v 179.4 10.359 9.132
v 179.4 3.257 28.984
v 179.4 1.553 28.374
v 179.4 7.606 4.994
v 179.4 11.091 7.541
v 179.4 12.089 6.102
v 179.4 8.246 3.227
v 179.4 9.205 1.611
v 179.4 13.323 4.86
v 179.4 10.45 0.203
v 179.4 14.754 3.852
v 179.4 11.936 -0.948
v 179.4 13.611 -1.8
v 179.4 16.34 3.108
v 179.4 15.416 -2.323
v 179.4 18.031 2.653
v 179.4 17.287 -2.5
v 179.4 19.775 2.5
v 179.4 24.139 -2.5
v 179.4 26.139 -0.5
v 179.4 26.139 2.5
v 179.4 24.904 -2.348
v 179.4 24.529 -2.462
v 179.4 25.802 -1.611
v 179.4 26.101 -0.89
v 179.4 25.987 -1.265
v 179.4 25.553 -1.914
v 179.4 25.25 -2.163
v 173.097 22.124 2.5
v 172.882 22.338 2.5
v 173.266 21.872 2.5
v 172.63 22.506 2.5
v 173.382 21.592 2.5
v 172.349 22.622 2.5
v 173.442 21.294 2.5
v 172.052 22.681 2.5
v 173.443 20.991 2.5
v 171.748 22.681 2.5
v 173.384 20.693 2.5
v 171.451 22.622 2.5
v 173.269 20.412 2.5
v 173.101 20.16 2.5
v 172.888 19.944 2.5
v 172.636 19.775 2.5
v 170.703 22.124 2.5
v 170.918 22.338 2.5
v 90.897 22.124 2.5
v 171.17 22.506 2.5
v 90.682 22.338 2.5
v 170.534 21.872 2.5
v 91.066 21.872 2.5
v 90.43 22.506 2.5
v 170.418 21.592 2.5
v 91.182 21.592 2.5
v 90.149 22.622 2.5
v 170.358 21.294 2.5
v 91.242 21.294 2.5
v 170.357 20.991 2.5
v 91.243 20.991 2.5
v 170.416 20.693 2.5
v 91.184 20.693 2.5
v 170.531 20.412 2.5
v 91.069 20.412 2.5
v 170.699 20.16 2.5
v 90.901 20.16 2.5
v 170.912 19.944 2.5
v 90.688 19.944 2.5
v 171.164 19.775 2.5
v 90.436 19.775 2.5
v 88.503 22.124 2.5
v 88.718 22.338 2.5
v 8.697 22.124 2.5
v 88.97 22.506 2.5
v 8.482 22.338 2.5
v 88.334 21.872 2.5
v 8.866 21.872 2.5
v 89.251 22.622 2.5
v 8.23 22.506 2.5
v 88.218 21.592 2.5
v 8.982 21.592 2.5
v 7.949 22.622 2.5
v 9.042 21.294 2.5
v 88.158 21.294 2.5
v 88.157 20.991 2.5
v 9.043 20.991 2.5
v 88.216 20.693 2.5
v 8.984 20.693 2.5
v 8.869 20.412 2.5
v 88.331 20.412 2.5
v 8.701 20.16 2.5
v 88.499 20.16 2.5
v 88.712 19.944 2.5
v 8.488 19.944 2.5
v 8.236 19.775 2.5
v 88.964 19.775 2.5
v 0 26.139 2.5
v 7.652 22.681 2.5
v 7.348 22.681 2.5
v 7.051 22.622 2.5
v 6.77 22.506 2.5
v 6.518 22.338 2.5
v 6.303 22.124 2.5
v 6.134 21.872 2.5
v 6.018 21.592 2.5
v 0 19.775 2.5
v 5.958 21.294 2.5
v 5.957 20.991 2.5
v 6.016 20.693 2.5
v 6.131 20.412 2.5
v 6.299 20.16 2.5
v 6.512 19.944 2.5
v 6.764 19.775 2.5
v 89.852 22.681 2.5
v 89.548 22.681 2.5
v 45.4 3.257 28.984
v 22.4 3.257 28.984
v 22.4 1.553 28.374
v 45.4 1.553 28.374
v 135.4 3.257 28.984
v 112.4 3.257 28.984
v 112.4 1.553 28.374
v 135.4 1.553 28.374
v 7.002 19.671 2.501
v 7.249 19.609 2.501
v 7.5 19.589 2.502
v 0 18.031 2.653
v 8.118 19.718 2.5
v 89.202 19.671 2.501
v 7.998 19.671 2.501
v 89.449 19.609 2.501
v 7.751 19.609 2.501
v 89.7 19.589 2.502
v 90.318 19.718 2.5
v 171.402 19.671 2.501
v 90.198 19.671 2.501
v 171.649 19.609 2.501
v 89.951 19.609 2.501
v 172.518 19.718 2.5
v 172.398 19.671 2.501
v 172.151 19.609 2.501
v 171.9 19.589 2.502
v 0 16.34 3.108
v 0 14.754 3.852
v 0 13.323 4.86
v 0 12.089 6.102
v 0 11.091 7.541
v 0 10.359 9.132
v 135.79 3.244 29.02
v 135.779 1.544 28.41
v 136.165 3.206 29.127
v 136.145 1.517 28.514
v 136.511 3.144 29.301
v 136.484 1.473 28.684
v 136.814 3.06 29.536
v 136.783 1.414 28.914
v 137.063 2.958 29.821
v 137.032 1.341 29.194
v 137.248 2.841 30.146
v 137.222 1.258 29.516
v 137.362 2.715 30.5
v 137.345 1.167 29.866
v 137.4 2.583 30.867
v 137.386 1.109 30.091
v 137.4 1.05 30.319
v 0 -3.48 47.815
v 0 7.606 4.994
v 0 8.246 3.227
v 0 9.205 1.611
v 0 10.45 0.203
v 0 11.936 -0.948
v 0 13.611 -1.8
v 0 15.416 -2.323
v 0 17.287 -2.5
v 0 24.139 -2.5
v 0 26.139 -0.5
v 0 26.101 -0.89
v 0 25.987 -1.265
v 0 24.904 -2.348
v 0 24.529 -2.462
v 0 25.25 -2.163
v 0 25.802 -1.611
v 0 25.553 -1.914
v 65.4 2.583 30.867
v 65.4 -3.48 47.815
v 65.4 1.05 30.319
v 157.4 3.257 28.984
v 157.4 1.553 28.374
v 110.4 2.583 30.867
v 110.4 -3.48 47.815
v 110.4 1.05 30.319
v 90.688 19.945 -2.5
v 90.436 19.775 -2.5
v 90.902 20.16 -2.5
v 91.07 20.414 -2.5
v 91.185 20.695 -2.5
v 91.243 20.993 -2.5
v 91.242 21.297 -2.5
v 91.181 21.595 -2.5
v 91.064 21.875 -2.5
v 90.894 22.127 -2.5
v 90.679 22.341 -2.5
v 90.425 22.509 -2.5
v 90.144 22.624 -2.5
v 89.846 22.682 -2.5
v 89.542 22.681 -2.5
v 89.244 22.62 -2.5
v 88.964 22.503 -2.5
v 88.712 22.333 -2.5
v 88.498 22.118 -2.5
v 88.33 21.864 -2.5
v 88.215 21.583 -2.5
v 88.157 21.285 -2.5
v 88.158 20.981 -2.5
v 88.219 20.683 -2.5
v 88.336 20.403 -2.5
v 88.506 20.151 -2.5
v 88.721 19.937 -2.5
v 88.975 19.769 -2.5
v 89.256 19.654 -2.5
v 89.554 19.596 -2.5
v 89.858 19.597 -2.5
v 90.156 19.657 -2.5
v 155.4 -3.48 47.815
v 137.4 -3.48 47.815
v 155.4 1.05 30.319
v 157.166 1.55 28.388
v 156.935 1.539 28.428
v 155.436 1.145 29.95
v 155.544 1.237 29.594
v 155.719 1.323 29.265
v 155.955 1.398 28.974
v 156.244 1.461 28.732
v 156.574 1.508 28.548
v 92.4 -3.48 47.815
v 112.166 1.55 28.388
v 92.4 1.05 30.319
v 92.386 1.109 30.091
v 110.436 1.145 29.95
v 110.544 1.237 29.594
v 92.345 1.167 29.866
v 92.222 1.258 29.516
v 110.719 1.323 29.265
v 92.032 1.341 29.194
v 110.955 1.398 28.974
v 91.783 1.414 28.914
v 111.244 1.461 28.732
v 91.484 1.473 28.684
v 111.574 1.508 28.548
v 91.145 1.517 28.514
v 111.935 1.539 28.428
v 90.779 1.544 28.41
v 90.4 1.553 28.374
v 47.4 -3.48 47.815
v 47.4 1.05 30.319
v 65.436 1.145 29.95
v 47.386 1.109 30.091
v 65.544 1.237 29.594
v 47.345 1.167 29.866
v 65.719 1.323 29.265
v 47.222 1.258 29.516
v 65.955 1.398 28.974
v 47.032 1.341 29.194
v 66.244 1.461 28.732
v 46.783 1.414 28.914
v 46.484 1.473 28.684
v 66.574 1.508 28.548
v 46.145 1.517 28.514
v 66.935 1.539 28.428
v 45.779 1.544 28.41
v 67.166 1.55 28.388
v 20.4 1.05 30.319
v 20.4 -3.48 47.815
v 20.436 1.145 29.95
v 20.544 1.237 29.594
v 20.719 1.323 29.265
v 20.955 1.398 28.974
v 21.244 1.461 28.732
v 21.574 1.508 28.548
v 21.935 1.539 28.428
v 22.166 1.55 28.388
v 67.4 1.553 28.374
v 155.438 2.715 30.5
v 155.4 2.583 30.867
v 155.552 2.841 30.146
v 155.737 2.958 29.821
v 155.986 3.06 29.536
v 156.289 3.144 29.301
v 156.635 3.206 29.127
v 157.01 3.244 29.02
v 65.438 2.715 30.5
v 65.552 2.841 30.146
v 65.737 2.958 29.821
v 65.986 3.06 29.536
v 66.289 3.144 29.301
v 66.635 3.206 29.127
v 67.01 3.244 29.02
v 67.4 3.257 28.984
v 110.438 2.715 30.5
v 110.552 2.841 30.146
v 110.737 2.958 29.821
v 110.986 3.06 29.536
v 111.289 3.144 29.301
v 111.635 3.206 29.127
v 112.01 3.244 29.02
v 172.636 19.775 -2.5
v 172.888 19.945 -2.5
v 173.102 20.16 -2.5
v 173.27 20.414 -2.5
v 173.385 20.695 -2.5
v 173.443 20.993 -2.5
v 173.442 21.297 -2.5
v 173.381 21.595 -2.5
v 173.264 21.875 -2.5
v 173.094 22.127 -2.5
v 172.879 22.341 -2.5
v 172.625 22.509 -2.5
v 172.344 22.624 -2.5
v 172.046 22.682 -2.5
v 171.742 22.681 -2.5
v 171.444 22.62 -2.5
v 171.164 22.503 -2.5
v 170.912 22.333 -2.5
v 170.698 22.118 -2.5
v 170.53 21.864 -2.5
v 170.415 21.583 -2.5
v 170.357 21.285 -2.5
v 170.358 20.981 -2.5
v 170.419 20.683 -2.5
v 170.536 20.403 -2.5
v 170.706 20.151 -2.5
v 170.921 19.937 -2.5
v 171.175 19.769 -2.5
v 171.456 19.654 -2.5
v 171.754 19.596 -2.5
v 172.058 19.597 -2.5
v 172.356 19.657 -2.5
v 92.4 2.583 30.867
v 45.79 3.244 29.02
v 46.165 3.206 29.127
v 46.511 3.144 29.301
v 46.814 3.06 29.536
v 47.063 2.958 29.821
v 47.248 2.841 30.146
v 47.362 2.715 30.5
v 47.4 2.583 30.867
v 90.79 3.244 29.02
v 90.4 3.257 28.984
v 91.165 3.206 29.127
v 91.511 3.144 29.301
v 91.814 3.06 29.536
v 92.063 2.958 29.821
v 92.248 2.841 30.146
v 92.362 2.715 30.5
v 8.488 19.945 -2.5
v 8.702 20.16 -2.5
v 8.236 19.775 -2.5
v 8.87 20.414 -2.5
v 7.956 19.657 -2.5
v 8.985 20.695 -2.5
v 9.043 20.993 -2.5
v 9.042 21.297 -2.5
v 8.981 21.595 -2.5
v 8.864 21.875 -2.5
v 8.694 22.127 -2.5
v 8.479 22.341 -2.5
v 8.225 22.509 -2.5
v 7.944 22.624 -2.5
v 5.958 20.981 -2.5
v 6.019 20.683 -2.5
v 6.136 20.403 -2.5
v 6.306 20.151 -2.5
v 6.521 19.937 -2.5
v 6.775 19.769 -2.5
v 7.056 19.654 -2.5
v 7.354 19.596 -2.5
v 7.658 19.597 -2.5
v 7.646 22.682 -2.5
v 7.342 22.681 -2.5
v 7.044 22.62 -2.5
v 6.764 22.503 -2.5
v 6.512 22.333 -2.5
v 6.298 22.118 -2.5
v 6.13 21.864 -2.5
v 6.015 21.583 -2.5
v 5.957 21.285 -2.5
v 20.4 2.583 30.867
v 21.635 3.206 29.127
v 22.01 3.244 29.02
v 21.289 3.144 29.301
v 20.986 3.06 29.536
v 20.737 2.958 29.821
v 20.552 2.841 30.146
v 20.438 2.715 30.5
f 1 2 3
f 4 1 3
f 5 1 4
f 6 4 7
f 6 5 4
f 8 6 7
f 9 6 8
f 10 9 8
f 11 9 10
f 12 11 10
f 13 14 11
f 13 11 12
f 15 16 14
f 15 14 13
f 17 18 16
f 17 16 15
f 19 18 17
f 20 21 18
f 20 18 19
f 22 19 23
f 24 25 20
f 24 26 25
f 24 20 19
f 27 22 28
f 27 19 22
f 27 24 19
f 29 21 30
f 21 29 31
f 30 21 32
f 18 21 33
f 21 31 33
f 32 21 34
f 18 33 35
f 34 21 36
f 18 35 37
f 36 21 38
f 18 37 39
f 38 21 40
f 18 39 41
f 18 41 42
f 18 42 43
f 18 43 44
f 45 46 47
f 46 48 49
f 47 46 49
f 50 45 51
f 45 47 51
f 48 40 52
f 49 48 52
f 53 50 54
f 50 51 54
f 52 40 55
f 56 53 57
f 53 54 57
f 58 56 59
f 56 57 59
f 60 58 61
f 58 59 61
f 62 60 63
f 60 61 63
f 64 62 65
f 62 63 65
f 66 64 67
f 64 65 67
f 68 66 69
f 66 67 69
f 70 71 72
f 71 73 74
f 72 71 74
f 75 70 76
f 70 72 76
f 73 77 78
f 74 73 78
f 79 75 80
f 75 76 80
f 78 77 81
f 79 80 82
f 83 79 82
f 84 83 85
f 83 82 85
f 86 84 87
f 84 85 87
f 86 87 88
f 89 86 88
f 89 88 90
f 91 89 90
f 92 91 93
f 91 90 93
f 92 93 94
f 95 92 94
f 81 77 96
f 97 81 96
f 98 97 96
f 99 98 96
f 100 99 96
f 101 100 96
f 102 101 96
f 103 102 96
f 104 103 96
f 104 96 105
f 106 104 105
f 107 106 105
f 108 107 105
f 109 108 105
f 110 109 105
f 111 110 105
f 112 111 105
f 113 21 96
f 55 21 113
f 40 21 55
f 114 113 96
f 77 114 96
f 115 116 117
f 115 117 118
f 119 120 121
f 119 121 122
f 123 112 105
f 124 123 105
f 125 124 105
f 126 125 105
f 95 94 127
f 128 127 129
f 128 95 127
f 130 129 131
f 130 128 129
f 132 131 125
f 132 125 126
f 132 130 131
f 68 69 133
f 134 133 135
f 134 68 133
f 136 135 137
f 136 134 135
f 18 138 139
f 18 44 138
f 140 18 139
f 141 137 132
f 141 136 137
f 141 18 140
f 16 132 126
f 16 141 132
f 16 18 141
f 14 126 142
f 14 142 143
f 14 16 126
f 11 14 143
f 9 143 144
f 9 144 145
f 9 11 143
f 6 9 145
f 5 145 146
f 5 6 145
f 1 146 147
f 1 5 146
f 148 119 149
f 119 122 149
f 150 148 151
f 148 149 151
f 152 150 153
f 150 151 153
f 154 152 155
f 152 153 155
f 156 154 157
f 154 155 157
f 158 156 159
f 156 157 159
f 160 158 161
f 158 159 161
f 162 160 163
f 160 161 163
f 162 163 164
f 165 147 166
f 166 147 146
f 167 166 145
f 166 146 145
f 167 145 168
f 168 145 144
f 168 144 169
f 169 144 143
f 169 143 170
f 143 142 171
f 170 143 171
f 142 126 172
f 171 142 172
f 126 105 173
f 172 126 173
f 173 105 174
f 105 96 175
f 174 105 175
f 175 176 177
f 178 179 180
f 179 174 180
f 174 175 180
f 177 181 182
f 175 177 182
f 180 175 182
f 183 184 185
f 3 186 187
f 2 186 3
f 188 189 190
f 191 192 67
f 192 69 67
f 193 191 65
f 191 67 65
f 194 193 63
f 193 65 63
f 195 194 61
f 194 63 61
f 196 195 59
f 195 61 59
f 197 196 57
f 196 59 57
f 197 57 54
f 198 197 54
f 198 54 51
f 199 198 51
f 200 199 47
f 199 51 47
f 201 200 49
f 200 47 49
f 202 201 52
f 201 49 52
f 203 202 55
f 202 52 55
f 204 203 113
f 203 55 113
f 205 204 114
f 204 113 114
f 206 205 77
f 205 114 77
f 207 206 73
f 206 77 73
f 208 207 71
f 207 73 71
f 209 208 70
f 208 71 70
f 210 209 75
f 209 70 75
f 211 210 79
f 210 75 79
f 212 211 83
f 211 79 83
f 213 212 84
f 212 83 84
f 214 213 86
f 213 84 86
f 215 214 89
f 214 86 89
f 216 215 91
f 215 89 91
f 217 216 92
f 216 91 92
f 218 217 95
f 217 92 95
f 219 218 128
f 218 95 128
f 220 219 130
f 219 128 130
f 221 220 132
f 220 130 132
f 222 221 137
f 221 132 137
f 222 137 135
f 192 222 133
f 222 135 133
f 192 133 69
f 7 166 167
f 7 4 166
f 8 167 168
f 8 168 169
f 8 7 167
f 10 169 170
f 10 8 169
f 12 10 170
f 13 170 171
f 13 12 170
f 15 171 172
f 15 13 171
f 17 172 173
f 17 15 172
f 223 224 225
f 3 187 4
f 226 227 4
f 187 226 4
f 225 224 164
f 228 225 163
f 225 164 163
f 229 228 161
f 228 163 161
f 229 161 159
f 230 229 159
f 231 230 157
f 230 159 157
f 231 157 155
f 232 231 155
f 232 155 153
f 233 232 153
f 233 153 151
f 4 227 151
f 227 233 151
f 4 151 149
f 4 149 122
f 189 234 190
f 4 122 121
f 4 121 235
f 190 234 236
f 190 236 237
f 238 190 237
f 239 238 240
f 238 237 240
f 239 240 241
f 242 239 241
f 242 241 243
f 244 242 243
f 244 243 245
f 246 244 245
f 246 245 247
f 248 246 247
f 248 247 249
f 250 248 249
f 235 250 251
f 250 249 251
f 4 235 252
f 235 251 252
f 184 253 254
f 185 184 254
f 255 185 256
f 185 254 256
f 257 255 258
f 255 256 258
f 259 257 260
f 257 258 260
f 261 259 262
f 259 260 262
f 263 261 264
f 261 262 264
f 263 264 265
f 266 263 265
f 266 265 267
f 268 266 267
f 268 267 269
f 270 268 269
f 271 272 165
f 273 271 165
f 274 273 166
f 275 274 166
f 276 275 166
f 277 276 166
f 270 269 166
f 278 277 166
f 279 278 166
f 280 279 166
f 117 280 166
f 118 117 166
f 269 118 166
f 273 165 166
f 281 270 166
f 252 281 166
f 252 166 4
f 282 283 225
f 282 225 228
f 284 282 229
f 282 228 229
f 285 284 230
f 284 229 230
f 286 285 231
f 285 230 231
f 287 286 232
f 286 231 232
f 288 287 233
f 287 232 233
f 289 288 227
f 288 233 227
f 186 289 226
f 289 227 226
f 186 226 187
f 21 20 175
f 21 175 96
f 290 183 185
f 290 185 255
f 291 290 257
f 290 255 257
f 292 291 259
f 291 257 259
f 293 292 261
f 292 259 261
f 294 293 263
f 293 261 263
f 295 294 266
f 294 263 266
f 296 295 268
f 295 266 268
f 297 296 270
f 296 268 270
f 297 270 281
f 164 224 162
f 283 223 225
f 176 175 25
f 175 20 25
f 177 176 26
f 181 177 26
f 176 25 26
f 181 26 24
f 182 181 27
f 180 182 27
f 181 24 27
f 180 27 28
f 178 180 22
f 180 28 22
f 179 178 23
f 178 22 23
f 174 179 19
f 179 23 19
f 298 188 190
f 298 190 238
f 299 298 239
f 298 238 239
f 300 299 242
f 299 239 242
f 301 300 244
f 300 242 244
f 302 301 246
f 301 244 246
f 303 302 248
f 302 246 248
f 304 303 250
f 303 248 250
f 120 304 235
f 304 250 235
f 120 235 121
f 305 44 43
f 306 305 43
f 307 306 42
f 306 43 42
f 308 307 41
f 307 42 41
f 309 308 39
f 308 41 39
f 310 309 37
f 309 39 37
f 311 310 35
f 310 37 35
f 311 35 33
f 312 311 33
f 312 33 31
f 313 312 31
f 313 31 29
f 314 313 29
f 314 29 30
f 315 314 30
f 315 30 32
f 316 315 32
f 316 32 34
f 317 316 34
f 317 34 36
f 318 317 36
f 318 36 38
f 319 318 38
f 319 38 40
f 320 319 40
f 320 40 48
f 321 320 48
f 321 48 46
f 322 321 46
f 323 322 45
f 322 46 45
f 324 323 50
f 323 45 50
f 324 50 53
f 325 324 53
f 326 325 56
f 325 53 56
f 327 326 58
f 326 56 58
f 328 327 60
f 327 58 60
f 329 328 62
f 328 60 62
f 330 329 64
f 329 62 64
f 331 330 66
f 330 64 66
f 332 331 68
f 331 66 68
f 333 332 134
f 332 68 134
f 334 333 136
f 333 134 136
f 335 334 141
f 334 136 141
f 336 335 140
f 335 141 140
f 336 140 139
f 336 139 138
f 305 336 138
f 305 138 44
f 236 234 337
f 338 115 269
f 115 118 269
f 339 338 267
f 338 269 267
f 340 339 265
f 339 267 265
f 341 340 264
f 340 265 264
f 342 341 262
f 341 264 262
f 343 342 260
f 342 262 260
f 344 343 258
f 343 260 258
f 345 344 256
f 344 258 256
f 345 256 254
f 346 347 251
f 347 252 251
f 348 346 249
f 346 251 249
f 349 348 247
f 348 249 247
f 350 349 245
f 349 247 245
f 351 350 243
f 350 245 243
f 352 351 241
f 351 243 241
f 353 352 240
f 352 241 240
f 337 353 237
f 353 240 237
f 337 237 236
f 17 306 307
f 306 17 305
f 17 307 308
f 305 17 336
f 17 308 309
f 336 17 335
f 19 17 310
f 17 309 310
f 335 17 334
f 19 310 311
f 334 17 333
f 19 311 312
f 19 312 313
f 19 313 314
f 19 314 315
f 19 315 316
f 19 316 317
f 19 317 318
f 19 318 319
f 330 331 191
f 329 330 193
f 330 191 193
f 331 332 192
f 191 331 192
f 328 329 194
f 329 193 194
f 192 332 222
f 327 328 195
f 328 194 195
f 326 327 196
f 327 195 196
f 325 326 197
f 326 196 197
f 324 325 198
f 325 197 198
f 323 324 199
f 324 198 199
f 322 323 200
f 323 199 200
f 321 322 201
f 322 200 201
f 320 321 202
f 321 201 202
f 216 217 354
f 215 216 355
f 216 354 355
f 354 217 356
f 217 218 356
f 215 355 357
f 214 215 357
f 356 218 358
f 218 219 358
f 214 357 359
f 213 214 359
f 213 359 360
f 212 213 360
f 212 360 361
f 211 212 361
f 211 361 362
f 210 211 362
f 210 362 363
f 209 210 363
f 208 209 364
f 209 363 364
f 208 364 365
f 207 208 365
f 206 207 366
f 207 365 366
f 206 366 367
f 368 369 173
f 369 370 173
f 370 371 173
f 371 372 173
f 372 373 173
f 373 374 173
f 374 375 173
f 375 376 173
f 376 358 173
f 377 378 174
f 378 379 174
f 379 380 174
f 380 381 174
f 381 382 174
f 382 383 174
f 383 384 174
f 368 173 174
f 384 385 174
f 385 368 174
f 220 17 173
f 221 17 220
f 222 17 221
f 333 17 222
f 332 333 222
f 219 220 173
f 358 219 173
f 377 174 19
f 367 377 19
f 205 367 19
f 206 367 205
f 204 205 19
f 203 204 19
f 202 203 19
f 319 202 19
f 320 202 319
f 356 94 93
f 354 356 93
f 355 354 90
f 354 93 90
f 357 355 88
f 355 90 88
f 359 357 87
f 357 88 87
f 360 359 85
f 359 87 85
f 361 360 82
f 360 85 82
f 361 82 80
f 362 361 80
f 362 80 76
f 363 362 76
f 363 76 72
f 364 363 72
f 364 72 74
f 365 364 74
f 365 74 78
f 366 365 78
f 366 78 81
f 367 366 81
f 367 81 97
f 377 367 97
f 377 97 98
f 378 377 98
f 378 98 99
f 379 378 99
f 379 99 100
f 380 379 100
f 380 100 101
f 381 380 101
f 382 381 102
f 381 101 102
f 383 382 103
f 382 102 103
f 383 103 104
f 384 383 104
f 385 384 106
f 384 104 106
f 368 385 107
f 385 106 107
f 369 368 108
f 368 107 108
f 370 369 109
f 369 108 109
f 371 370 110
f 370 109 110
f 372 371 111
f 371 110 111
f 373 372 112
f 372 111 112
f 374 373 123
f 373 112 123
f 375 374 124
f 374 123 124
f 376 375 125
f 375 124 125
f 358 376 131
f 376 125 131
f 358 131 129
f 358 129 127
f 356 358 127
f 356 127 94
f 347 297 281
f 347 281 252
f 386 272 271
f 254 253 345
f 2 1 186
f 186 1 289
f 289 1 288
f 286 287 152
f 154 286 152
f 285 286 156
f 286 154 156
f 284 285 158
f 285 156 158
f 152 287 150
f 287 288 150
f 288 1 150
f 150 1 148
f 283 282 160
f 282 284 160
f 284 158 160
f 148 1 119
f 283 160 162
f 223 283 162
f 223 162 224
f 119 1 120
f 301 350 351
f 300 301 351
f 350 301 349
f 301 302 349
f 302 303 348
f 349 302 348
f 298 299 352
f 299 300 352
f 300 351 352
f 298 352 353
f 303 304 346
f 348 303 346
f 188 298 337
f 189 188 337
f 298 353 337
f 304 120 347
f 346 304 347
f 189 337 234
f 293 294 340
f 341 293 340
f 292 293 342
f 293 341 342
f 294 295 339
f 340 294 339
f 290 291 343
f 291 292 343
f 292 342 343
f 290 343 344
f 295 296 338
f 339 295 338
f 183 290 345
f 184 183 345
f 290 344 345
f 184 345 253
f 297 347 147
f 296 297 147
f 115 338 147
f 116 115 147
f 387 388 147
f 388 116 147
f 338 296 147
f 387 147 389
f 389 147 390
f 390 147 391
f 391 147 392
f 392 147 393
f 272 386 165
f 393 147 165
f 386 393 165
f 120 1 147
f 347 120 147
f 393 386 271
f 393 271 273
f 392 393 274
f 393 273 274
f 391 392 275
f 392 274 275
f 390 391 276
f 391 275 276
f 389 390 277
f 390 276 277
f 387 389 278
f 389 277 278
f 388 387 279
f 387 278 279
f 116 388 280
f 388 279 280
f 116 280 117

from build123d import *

# Parameters (mm, degrees)
BOSS_EXTRUDE1_DEPTH = 179.4
FILLET1_R           = 10
FILLET3_R           = 2
SKETCH3_R           = 1.55
CUT_EXTRUDE2_DEPTH  = 10
CUT_EXTRUDE4_REACH  = 187.252
SKETCH6_W           = 27
SKETCH6_H           = 20
FILLET4_R           = 2


with BuildPart() as part:
    # Sketch1 → Boss-Extrude1 (new body)
    with BuildSketch(Plane(origin=(0, 0, 0), x_dir=(0, 0, -1), z_dir=(1, 0, 0))):
        Polygon((-2.5, 26.138937515), (-2.5, 12.731613167), (-47.815237798, -3.479647722), (2.5, 9.546261863), (2.5, 26.138937515), align=None)
    extrude(amount=BOSS_EXTRUDE1_DEPTH)

    # Fillet1
    fillet1_edges = [part.edges().sort_by_distance(p)[0] for p in [
        (89.7, 12.731613167, 2.5),
        (89.7, 9.546261863, -2.5),
    ]]
    fillet(fillet1_edges, radius=FILLET1_R)

    # Fillet3
    fillet3_edges = [part.edges().sort_by_distance(p)[0] for p in [
        (89.7, 26.138937515, -2.5),
    ]]
    fillet(fillet3_edges, radius=FILLET3_R)

    # Sketch3 → Cut-Extrude2 (cut, symmetric)
    with BuildSketch(Plane.XY.offset(2.5)):
        with Locations(Location((7.5, 21.138937515, 0), (0, 0, 298.348188053))):
            Circle(SKETCH3_R)
        with Locations(Location((171.9, 21.138937515, 0), (0, 0, 298.348188053))):
            Circle(SKETCH3_R)
        with Locations(Location((89.7, 21.138937515, 0), (0, 0, 298.348188053))):
            Circle(SKETCH3_R)
    extrude(amount=CUT_EXTRUDE2_DEPTH, both=True, mode=Mode.SUBTRACT)

    # Sketch6 → Cut-Extrude4 (cut, up to next)
    with BuildSketch(Plane(origin=(0, 12.079968612, 4.321538013), x_dir=(1, 0, 0), z_dir=(0, 0.9415624549372754, 0.33683845304907145)), mode=Mode.PRIVATE) as cut_extrude4_sk1:
        with Locations((168.9, -36.19311184)):
            Rectangle(SKETCH6_W, SKETCH6_H)
    cut_extrude4_tool1 = extrude(cut_extrude4_sk1.sketch, amount=-CUT_EXTRUDE4_REACH, mode=Mode.PRIVATE) & part.part
    # Sketch6 → Cut-Extrude4 (cut, up to next)
    with BuildSketch(Plane(origin=(0, 12.079968612, 4.321538013), x_dir=(1, 0, 0), z_dir=(0, 0.9415624549372754, 0.33683845304907145)), mode=Mode.PRIVATE) as cut_extrude4_sk2:
        with Locations((123.9, -36.19311184)):
            Rectangle(SKETCH6_W, SKETCH6_H)
    cut_extrude4_tool2 = extrude(cut_extrude4_sk2.sketch, amount=-CUT_EXTRUDE4_REACH, mode=Mode.PRIVATE) & part.part
    # Sketch6 → Cut-Extrude4 (cut, up to next)
    with BuildSketch(Plane(origin=(0, 12.079968612, 4.321538013), x_dir=(1, 0, 0), z_dir=(0, 0.9415624549372754, 0.33683845304907145)), mode=Mode.PRIVATE) as cut_extrude4_sk3:
        with Locations((78.9, -36.19311184)):
            Rectangle(SKETCH6_W, SKETCH6_H)
    cut_extrude4_tool3 = extrude(cut_extrude4_sk3.sketch, amount=-CUT_EXTRUDE4_REACH, mode=Mode.PRIVATE) & part.part
    # Sketch6 → Cut-Extrude4 (cut, up to next)
    with BuildSketch(Plane(origin=(0, 12.079968612, 4.321538013), x_dir=(1, 0, 0), z_dir=(0, 0.9415624549372754, 0.33683845304907145)), mode=Mode.PRIVATE) as cut_extrude4_sk4:
        with Locations((33.9, -36.19311184)):
            Rectangle(SKETCH6_W, SKETCH6_H)
    cut_extrude4_tool4 = extrude(cut_extrude4_sk4.sketch, amount=-CUT_EXTRUDE4_REACH, mode=Mode.PRIVATE) & part.part
    add(cut_extrude4_tool1.solids().sort_by_distance((168.9, -0.111263, 38.399613))[0], mode=Mode.SUBTRACT)
    add(cut_extrude4_tool2.solids().sort_by_distance((123.9, -0.111263, 38.399613))[0], mode=Mode.SUBTRACT)
    add(cut_extrude4_tool3.solids().sort_by_distance((78.9, -0.111263, 38.399613))[0], mode=Mode.SUBTRACT)
    add(cut_extrude4_tool4.solids().sort_by_distance((33.9, -0.111263, 38.399613))[0], mode=Mode.SUBTRACT)

    # Fillet4
    fillet4_edges = [part.edges().sort_by_distance(p)[0] for p in [
        (155.4, 2.405209731, 28.679222311),
        (110.4, 2.405209731, 28.679222311),
        (137.4, 2.405209731, 28.679222311),
        (65.4, 2.405209731, 28.679222311),
        (92.4, 2.405209731, 28.679222311),
        (20.4, 2.405209731, 28.679222311),
        (47.4, 2.405209731, 28.679222311),
    ]]
    fillet(fillet4_edges, radius=FILLET4_R)


solid = part.part
